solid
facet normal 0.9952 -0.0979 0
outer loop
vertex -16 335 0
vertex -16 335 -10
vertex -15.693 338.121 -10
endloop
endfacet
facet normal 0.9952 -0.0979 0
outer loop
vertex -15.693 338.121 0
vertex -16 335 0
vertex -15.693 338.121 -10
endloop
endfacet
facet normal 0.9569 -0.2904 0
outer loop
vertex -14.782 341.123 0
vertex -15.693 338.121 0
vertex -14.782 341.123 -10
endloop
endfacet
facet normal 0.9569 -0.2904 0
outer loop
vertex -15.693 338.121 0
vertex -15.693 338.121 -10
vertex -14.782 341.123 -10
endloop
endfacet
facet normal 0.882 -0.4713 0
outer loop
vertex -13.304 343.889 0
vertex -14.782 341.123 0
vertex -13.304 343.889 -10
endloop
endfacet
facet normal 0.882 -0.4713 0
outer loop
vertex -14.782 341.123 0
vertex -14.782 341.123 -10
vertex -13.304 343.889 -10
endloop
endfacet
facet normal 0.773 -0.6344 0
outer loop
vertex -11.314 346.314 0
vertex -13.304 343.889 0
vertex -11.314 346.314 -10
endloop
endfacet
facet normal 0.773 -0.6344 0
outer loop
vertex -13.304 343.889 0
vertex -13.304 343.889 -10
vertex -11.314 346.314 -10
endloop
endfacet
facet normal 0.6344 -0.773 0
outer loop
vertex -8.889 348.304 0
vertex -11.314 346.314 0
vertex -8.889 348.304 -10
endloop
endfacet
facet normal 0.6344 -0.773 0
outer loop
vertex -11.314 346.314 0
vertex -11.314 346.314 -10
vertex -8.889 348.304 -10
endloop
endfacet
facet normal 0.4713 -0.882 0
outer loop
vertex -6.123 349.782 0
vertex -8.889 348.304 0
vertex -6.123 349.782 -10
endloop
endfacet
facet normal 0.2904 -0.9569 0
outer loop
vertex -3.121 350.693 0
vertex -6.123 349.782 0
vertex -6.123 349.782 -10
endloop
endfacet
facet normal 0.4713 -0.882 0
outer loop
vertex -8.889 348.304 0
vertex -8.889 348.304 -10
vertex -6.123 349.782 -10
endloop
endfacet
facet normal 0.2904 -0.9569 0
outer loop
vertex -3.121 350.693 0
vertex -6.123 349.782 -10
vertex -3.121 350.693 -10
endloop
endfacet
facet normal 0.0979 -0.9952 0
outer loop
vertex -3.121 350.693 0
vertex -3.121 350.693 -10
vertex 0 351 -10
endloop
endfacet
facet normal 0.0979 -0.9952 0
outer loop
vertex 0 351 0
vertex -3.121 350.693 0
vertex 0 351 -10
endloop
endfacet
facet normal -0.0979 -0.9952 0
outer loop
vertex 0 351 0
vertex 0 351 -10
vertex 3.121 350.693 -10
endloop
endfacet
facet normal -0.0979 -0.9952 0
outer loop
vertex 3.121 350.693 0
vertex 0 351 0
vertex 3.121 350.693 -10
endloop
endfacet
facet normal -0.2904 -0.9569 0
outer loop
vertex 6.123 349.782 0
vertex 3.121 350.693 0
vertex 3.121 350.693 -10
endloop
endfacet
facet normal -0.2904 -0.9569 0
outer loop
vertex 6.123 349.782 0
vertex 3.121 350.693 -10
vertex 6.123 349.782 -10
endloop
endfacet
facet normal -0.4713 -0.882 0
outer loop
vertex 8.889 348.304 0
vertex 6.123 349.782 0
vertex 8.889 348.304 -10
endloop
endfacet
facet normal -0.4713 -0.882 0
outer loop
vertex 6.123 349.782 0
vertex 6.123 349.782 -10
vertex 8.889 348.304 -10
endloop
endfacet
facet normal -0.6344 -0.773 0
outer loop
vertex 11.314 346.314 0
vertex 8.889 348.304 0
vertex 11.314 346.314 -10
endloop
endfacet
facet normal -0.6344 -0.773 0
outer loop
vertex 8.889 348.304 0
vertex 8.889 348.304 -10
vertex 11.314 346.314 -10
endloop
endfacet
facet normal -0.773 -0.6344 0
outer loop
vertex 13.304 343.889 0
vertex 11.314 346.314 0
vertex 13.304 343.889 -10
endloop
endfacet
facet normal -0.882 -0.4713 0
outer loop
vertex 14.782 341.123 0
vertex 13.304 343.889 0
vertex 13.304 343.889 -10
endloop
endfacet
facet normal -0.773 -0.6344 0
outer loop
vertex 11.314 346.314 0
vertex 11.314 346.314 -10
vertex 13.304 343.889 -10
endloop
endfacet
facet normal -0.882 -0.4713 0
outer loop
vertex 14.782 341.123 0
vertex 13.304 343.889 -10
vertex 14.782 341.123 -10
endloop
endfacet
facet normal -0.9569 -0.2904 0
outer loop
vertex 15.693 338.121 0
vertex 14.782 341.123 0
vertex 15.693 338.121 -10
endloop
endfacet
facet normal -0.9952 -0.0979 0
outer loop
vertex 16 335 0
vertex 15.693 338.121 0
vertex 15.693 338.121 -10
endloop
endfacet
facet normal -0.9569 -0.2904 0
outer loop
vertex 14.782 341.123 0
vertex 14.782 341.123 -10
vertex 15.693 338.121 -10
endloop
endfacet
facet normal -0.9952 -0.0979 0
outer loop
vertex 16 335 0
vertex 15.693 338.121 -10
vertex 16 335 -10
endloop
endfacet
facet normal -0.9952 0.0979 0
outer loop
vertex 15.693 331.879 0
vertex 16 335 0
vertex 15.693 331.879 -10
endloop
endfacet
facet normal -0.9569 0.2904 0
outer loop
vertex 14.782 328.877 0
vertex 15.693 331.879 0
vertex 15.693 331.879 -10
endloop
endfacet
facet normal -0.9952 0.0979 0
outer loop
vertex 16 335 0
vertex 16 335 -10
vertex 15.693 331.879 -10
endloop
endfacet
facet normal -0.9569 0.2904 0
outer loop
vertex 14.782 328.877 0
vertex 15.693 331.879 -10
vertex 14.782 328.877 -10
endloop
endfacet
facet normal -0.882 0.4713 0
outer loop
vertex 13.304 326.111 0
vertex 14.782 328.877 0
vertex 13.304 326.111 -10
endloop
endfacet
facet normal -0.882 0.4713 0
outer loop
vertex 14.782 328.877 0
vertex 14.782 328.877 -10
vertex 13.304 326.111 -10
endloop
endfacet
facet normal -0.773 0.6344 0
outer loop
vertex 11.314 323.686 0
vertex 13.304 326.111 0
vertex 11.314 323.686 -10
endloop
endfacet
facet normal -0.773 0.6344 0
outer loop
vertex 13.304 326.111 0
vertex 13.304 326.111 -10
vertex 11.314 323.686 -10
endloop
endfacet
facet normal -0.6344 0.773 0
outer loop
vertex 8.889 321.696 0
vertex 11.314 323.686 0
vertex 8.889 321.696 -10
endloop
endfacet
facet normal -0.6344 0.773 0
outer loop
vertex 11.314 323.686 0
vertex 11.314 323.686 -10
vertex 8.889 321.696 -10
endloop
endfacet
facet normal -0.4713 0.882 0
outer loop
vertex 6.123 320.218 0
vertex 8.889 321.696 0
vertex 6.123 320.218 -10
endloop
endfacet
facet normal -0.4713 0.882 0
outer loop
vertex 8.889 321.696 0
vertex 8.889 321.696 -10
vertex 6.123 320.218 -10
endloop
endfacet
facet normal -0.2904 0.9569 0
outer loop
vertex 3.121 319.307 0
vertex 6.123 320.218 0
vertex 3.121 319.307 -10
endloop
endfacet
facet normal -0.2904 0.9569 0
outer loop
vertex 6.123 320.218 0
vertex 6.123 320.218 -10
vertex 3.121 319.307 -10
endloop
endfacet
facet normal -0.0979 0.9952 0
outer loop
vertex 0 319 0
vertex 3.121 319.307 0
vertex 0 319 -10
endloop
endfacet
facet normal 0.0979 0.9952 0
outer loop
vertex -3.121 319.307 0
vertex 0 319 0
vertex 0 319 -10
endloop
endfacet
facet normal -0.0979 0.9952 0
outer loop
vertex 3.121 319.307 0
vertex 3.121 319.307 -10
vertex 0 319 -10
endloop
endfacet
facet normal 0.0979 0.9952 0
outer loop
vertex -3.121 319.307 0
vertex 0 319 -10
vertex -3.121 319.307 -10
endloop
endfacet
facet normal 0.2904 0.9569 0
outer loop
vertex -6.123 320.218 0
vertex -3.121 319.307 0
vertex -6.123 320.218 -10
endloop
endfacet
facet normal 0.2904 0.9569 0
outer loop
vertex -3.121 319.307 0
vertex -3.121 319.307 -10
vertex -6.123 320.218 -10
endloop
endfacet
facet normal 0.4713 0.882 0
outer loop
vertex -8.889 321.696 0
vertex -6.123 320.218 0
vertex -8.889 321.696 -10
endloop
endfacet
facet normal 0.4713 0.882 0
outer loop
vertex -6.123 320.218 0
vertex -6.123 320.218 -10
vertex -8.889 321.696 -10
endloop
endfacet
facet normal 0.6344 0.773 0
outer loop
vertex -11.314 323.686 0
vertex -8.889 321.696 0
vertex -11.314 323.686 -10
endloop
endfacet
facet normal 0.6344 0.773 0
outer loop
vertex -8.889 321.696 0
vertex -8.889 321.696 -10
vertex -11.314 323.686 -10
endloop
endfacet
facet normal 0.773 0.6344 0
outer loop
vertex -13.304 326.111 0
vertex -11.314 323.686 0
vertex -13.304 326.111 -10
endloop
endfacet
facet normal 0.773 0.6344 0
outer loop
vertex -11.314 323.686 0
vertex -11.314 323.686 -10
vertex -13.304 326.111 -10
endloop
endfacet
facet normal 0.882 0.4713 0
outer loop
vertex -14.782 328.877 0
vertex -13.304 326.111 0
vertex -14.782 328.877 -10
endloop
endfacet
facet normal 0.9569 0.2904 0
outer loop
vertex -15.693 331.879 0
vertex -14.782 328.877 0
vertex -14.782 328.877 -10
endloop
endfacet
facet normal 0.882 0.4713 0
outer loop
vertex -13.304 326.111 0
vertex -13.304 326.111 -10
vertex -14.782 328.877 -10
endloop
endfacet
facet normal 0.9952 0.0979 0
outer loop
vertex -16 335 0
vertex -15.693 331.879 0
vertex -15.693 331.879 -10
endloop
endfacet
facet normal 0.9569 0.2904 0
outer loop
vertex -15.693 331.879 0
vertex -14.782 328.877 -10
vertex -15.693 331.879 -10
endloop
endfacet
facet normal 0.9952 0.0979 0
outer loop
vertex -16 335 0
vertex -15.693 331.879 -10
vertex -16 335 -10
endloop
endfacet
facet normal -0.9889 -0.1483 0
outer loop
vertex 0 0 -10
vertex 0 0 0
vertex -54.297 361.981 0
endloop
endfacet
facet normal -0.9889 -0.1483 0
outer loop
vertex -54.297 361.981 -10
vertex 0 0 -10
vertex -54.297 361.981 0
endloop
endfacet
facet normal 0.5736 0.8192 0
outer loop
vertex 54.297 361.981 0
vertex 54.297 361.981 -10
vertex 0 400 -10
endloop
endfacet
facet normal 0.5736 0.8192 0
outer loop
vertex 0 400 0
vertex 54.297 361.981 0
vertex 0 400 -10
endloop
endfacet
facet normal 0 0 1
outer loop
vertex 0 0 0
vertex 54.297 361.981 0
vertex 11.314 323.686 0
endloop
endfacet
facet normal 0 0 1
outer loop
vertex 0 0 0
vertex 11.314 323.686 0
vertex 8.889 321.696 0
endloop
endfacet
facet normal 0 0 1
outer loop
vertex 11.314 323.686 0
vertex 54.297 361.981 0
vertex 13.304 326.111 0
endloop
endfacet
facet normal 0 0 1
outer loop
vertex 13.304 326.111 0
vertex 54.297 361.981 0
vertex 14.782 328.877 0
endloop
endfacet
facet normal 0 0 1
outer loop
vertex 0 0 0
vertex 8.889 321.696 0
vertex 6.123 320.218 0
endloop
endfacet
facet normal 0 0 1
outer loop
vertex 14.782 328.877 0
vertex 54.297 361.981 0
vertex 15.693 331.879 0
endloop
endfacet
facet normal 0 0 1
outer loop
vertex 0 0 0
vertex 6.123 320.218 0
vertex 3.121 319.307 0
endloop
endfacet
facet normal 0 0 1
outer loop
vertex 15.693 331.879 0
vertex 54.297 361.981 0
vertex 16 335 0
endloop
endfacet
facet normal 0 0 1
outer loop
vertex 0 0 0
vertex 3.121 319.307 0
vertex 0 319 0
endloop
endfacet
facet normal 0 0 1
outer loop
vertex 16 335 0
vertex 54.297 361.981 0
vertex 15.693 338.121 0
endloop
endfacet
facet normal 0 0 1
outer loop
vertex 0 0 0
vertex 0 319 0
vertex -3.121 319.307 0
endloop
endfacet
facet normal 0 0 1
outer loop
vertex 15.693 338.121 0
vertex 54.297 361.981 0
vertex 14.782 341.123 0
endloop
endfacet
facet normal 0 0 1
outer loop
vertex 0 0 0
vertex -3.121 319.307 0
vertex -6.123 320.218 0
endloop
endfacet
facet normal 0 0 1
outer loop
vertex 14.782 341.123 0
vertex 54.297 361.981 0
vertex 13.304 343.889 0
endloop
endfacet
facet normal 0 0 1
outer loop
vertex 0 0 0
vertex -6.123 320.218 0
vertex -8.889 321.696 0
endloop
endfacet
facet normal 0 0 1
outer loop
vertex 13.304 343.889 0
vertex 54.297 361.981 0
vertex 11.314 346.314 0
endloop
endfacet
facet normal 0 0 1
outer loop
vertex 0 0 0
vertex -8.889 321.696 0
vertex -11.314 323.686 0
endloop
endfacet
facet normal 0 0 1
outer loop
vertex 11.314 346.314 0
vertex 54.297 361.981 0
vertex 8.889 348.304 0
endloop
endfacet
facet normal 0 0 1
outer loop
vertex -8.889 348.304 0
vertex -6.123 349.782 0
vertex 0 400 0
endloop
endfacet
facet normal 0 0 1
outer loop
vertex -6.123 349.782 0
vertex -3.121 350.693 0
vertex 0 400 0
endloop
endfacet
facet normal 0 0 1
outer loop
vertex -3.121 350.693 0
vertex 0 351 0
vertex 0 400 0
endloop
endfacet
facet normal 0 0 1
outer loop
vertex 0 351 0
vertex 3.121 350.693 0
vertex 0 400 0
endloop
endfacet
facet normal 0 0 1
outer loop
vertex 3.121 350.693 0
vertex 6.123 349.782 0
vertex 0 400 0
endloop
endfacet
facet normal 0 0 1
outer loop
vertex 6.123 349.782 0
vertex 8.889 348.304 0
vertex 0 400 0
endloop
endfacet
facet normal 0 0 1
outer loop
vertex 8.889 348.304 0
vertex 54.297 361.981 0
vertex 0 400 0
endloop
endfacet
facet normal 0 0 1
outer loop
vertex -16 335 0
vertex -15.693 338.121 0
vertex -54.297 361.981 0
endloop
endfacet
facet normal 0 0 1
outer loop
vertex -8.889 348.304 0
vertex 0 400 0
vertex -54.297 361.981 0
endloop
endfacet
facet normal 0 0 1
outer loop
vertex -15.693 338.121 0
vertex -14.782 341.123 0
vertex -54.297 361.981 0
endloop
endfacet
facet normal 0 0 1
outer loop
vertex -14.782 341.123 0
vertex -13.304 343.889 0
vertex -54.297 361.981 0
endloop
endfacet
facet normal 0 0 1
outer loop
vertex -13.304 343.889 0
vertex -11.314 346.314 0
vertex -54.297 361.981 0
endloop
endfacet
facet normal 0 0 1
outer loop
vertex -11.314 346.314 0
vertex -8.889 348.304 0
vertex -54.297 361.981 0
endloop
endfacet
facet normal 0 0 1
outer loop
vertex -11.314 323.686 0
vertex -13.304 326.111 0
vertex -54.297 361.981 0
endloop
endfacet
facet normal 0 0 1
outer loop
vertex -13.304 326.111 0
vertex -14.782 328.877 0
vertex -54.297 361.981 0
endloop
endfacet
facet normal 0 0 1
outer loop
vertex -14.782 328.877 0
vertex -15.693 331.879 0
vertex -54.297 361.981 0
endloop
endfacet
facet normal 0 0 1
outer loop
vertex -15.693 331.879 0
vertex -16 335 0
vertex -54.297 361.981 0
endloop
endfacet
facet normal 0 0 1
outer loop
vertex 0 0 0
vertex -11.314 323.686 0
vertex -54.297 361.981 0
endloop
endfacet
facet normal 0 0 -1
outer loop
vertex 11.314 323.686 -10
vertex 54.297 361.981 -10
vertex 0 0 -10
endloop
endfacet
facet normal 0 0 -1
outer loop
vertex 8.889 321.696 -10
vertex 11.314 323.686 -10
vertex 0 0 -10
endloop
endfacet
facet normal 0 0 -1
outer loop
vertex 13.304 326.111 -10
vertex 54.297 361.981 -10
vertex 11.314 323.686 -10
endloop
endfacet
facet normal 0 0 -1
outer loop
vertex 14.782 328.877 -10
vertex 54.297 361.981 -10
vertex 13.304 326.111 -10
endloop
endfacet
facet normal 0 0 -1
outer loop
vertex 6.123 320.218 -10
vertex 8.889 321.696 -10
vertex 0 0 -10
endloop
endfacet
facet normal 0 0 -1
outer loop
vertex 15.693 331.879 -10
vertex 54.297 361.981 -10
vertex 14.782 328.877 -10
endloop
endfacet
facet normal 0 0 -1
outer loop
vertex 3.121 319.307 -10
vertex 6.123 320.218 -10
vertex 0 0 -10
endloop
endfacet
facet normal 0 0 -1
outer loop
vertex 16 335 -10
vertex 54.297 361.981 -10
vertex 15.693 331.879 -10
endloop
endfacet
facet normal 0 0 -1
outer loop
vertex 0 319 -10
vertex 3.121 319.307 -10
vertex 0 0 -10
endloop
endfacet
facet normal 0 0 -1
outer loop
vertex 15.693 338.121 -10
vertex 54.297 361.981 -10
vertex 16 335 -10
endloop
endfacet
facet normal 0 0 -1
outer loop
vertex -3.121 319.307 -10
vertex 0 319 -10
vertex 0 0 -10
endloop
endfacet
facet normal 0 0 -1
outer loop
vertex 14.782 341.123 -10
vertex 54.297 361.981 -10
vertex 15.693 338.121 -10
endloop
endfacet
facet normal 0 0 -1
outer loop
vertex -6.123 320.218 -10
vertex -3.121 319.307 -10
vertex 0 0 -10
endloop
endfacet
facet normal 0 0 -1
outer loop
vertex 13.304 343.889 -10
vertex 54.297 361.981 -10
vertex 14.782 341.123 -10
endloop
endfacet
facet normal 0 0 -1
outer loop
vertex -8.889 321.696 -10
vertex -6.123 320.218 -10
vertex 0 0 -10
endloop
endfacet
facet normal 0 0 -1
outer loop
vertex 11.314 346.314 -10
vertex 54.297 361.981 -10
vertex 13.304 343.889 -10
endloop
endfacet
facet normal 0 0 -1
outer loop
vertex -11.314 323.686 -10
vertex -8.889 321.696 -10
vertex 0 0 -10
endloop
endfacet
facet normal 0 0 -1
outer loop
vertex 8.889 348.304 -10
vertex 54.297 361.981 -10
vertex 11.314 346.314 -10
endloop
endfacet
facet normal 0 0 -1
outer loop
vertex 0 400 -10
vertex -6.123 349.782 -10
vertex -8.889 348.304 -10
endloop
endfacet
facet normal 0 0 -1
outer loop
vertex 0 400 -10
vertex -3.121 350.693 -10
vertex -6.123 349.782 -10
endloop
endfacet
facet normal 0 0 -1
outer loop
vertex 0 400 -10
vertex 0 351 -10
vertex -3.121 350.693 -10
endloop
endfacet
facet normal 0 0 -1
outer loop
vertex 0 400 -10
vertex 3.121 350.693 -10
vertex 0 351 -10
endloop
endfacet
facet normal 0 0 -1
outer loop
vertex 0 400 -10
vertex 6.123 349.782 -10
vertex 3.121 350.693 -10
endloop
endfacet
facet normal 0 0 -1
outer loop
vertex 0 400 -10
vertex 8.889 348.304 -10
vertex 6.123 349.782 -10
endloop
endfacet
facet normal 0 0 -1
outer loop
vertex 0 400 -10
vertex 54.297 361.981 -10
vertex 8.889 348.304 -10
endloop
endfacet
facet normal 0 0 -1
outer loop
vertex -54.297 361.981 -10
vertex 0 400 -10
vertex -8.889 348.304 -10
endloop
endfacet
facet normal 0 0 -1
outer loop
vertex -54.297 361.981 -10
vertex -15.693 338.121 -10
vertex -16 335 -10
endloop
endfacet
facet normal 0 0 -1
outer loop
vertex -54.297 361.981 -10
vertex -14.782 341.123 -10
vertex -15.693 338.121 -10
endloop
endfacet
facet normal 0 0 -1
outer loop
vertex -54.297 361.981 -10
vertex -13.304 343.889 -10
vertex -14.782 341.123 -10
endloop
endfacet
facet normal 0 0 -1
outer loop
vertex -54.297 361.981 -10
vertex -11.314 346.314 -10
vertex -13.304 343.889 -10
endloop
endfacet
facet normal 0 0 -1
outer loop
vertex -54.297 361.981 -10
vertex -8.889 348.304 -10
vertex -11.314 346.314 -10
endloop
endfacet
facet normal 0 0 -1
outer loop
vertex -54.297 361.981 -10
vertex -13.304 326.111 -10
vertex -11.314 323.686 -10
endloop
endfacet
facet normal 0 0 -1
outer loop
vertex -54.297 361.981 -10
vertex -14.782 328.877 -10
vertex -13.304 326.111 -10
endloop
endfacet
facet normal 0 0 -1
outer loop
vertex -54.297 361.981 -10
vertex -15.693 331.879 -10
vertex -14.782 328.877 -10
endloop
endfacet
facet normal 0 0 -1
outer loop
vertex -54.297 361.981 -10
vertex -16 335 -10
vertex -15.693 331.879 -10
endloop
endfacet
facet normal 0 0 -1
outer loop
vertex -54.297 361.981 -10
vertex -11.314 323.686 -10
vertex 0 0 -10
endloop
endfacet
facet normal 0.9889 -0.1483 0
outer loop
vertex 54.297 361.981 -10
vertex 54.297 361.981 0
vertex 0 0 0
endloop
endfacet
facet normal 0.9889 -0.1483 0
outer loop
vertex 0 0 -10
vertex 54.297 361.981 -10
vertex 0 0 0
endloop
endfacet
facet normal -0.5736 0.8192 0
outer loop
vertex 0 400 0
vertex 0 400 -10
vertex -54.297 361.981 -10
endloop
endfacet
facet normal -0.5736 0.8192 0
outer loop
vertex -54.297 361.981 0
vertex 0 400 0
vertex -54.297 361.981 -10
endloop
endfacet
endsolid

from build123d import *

# Parameters (mm, degrees)
T_LE_DE_BASE_PLI_E1_DEPTH = 10
ENL_V_MAT_EXTRU_1_DEPTH   = 405.598566483
ESQUISSE7_R               = 16
ENL_V_MAT_EXTRU_2_DEPTH   = 10


# Sheet-metal steps are written as plain solids
with BuildPart() as part:
    # Esquisse1 → Tôle de base pliée1 (new body)
    with BuildSketch(Plane.XY):
        Polygon((0, 0), (-60, 400), (60, 400), align=None)
    extrude(amount=-T_LE_DE_BASE_PLI_E1_DEPTH)

    # Esquisse6 → Enlèv. mat.-Extru.1 (cut, through all)
    with BuildSketch(Plane(origin=(0, 0, -10), x_dir=(-1, 0, 0), z_dir=(0, 0, -1))):
        Polygon((60, 400), (0, 400), (54.297112843, 361.980752285), align=None)
        Polygon((-54.297112843, 361.980752285), (0, 400), (-60, 400), align=None)
    extrude(amount=-ENL_V_MAT_EXTRU_1_DEPTH, mode=Mode.SUBTRACT)

    # Esquisse7 → Enlèv. mat.-Extru.2 (cut)
    with BuildSketch(Plane(origin=(0, 0, -10), x_dir=(-1, 0, 0), z_dir=(0, 0, -1))):
        with Locations((0, 335)):
            Circle(ESQUISSE7_R)
    extrude(amount=-ENL_V_MAT_EXTRU_2_DEPTH, mode=Mode.SUBTRACT)


solid = part.part
